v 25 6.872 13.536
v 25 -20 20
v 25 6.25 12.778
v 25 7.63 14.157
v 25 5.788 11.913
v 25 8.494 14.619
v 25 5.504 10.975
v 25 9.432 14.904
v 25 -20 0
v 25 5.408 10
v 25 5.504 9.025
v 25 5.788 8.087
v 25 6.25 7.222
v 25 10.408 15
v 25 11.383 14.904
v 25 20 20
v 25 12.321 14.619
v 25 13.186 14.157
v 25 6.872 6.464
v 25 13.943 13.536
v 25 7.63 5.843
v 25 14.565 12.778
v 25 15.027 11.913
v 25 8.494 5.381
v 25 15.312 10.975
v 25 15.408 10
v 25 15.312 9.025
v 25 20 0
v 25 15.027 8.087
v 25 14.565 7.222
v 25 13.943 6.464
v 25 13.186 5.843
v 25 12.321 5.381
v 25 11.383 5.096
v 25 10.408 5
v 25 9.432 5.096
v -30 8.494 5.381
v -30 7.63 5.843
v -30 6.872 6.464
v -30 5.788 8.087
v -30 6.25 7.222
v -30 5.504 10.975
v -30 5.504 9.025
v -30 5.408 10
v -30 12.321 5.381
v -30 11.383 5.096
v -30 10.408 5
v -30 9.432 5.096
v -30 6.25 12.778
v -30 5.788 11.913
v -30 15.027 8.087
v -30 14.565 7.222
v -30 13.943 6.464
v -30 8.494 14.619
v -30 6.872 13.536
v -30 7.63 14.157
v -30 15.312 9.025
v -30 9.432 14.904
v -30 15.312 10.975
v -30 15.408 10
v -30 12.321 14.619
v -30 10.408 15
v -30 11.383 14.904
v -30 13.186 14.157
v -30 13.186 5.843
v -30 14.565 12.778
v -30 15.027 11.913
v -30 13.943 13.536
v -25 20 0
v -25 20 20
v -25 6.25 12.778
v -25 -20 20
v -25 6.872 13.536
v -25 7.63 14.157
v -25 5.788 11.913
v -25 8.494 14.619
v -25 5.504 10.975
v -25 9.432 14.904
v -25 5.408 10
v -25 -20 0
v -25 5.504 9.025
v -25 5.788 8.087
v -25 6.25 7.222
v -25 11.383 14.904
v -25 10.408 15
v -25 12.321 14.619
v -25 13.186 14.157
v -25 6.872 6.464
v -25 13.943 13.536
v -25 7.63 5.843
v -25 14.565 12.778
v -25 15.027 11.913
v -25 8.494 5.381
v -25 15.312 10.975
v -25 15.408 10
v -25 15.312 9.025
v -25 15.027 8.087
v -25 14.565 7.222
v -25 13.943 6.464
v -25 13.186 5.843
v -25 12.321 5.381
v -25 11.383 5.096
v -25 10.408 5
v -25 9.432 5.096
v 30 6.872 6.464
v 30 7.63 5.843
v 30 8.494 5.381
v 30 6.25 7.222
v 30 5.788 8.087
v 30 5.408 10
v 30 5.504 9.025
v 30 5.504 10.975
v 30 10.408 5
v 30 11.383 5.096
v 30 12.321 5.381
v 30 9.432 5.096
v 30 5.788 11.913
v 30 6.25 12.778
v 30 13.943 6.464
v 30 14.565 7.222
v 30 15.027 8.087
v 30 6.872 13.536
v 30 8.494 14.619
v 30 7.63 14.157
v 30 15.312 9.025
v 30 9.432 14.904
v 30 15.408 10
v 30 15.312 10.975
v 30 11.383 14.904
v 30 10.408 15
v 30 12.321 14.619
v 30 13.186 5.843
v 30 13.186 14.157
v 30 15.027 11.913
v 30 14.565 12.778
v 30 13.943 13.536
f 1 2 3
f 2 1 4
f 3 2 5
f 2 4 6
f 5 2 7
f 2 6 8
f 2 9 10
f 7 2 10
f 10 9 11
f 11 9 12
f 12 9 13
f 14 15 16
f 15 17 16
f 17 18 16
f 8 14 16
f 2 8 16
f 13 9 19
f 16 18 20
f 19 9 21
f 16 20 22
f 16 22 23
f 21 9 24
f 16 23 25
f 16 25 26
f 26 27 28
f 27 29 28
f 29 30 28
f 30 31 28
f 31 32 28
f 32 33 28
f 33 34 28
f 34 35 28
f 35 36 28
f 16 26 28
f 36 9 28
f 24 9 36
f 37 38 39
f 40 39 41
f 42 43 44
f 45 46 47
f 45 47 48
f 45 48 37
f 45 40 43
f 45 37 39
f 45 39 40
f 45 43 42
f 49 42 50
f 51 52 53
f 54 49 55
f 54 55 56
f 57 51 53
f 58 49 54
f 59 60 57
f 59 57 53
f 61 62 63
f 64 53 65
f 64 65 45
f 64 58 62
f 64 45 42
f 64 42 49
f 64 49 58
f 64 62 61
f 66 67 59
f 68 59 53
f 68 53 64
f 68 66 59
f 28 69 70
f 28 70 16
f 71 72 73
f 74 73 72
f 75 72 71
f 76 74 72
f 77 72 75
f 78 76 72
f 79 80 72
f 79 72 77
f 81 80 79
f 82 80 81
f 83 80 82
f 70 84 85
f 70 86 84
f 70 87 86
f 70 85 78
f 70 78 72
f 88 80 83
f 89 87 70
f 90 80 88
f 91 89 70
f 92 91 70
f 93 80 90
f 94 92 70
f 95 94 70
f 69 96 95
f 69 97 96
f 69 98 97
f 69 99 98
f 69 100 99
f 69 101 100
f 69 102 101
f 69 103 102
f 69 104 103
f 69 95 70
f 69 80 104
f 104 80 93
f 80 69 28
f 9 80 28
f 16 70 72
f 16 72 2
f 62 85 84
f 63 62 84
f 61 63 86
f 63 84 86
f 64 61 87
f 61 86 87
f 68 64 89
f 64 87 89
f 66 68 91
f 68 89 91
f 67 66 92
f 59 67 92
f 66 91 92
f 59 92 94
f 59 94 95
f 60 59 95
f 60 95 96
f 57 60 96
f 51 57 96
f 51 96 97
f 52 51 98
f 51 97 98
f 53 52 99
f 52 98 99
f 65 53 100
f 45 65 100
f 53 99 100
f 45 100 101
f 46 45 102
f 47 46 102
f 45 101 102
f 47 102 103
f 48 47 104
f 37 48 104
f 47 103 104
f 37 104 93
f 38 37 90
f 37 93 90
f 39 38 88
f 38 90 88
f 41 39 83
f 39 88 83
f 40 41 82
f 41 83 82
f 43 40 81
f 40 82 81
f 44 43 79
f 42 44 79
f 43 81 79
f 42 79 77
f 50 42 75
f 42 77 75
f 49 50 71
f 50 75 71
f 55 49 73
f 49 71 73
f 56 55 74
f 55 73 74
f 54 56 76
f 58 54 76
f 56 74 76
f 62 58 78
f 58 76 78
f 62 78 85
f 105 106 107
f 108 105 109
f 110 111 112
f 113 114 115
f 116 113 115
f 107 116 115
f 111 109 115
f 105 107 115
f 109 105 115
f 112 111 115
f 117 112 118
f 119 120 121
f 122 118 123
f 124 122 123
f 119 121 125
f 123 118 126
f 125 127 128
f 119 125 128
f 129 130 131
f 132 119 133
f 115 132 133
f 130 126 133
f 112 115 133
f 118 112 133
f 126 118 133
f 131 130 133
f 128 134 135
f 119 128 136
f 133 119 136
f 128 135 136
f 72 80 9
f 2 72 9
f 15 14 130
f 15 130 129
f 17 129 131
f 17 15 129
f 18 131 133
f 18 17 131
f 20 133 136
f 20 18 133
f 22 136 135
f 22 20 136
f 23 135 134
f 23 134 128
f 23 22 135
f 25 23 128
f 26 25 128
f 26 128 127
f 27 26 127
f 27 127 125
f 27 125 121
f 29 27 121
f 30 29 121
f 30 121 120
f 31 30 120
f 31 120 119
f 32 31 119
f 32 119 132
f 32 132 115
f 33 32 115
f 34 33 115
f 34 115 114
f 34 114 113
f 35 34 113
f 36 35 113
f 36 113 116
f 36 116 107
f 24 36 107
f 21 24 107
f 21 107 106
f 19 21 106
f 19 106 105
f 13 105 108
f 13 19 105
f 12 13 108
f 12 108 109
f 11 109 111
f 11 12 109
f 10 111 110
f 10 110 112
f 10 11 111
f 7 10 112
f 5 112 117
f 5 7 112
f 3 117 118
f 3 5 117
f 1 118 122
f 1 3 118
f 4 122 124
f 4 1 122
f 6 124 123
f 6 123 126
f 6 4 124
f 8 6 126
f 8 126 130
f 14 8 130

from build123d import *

# Parameters (mm, degrees)
SKETCH1_W                = 50
SKETCH1_H                = 40
BOSS_EXTRUDE1_DEPTH      = 20
SKETCH2_R                = 5
BOSS_EXTRUDE2_DEPTH      = 5
BOSS_EXTRUDE2_DEPTH_BACK = 55


with BuildPart() as part:
    # Sketch1 → Boss-Extrude1 (new body)
    with BuildSketch(Plane.XY):
        Rectangle(SKETCH1_W, SKETCH1_H)
    extrude(amount=BOSS_EXTRUDE1_DEPTH)

    # Sketch2 → Boss-Extrude2 (add, two sides)
    with BuildSketch(Plane.ZY.offset(25)) as boss_extrude2_sk:
        with Locations((10, 10.407747154)):
            Circle(SKETCH2_R)
    extrude(amount=BOSS_EXTRUDE2_DEPTH)
    extrude(boss_extrude2_sk.sketch, amount=-BOSS_EXTRUDE2_DEPTH_BACK)


solid = part.part
